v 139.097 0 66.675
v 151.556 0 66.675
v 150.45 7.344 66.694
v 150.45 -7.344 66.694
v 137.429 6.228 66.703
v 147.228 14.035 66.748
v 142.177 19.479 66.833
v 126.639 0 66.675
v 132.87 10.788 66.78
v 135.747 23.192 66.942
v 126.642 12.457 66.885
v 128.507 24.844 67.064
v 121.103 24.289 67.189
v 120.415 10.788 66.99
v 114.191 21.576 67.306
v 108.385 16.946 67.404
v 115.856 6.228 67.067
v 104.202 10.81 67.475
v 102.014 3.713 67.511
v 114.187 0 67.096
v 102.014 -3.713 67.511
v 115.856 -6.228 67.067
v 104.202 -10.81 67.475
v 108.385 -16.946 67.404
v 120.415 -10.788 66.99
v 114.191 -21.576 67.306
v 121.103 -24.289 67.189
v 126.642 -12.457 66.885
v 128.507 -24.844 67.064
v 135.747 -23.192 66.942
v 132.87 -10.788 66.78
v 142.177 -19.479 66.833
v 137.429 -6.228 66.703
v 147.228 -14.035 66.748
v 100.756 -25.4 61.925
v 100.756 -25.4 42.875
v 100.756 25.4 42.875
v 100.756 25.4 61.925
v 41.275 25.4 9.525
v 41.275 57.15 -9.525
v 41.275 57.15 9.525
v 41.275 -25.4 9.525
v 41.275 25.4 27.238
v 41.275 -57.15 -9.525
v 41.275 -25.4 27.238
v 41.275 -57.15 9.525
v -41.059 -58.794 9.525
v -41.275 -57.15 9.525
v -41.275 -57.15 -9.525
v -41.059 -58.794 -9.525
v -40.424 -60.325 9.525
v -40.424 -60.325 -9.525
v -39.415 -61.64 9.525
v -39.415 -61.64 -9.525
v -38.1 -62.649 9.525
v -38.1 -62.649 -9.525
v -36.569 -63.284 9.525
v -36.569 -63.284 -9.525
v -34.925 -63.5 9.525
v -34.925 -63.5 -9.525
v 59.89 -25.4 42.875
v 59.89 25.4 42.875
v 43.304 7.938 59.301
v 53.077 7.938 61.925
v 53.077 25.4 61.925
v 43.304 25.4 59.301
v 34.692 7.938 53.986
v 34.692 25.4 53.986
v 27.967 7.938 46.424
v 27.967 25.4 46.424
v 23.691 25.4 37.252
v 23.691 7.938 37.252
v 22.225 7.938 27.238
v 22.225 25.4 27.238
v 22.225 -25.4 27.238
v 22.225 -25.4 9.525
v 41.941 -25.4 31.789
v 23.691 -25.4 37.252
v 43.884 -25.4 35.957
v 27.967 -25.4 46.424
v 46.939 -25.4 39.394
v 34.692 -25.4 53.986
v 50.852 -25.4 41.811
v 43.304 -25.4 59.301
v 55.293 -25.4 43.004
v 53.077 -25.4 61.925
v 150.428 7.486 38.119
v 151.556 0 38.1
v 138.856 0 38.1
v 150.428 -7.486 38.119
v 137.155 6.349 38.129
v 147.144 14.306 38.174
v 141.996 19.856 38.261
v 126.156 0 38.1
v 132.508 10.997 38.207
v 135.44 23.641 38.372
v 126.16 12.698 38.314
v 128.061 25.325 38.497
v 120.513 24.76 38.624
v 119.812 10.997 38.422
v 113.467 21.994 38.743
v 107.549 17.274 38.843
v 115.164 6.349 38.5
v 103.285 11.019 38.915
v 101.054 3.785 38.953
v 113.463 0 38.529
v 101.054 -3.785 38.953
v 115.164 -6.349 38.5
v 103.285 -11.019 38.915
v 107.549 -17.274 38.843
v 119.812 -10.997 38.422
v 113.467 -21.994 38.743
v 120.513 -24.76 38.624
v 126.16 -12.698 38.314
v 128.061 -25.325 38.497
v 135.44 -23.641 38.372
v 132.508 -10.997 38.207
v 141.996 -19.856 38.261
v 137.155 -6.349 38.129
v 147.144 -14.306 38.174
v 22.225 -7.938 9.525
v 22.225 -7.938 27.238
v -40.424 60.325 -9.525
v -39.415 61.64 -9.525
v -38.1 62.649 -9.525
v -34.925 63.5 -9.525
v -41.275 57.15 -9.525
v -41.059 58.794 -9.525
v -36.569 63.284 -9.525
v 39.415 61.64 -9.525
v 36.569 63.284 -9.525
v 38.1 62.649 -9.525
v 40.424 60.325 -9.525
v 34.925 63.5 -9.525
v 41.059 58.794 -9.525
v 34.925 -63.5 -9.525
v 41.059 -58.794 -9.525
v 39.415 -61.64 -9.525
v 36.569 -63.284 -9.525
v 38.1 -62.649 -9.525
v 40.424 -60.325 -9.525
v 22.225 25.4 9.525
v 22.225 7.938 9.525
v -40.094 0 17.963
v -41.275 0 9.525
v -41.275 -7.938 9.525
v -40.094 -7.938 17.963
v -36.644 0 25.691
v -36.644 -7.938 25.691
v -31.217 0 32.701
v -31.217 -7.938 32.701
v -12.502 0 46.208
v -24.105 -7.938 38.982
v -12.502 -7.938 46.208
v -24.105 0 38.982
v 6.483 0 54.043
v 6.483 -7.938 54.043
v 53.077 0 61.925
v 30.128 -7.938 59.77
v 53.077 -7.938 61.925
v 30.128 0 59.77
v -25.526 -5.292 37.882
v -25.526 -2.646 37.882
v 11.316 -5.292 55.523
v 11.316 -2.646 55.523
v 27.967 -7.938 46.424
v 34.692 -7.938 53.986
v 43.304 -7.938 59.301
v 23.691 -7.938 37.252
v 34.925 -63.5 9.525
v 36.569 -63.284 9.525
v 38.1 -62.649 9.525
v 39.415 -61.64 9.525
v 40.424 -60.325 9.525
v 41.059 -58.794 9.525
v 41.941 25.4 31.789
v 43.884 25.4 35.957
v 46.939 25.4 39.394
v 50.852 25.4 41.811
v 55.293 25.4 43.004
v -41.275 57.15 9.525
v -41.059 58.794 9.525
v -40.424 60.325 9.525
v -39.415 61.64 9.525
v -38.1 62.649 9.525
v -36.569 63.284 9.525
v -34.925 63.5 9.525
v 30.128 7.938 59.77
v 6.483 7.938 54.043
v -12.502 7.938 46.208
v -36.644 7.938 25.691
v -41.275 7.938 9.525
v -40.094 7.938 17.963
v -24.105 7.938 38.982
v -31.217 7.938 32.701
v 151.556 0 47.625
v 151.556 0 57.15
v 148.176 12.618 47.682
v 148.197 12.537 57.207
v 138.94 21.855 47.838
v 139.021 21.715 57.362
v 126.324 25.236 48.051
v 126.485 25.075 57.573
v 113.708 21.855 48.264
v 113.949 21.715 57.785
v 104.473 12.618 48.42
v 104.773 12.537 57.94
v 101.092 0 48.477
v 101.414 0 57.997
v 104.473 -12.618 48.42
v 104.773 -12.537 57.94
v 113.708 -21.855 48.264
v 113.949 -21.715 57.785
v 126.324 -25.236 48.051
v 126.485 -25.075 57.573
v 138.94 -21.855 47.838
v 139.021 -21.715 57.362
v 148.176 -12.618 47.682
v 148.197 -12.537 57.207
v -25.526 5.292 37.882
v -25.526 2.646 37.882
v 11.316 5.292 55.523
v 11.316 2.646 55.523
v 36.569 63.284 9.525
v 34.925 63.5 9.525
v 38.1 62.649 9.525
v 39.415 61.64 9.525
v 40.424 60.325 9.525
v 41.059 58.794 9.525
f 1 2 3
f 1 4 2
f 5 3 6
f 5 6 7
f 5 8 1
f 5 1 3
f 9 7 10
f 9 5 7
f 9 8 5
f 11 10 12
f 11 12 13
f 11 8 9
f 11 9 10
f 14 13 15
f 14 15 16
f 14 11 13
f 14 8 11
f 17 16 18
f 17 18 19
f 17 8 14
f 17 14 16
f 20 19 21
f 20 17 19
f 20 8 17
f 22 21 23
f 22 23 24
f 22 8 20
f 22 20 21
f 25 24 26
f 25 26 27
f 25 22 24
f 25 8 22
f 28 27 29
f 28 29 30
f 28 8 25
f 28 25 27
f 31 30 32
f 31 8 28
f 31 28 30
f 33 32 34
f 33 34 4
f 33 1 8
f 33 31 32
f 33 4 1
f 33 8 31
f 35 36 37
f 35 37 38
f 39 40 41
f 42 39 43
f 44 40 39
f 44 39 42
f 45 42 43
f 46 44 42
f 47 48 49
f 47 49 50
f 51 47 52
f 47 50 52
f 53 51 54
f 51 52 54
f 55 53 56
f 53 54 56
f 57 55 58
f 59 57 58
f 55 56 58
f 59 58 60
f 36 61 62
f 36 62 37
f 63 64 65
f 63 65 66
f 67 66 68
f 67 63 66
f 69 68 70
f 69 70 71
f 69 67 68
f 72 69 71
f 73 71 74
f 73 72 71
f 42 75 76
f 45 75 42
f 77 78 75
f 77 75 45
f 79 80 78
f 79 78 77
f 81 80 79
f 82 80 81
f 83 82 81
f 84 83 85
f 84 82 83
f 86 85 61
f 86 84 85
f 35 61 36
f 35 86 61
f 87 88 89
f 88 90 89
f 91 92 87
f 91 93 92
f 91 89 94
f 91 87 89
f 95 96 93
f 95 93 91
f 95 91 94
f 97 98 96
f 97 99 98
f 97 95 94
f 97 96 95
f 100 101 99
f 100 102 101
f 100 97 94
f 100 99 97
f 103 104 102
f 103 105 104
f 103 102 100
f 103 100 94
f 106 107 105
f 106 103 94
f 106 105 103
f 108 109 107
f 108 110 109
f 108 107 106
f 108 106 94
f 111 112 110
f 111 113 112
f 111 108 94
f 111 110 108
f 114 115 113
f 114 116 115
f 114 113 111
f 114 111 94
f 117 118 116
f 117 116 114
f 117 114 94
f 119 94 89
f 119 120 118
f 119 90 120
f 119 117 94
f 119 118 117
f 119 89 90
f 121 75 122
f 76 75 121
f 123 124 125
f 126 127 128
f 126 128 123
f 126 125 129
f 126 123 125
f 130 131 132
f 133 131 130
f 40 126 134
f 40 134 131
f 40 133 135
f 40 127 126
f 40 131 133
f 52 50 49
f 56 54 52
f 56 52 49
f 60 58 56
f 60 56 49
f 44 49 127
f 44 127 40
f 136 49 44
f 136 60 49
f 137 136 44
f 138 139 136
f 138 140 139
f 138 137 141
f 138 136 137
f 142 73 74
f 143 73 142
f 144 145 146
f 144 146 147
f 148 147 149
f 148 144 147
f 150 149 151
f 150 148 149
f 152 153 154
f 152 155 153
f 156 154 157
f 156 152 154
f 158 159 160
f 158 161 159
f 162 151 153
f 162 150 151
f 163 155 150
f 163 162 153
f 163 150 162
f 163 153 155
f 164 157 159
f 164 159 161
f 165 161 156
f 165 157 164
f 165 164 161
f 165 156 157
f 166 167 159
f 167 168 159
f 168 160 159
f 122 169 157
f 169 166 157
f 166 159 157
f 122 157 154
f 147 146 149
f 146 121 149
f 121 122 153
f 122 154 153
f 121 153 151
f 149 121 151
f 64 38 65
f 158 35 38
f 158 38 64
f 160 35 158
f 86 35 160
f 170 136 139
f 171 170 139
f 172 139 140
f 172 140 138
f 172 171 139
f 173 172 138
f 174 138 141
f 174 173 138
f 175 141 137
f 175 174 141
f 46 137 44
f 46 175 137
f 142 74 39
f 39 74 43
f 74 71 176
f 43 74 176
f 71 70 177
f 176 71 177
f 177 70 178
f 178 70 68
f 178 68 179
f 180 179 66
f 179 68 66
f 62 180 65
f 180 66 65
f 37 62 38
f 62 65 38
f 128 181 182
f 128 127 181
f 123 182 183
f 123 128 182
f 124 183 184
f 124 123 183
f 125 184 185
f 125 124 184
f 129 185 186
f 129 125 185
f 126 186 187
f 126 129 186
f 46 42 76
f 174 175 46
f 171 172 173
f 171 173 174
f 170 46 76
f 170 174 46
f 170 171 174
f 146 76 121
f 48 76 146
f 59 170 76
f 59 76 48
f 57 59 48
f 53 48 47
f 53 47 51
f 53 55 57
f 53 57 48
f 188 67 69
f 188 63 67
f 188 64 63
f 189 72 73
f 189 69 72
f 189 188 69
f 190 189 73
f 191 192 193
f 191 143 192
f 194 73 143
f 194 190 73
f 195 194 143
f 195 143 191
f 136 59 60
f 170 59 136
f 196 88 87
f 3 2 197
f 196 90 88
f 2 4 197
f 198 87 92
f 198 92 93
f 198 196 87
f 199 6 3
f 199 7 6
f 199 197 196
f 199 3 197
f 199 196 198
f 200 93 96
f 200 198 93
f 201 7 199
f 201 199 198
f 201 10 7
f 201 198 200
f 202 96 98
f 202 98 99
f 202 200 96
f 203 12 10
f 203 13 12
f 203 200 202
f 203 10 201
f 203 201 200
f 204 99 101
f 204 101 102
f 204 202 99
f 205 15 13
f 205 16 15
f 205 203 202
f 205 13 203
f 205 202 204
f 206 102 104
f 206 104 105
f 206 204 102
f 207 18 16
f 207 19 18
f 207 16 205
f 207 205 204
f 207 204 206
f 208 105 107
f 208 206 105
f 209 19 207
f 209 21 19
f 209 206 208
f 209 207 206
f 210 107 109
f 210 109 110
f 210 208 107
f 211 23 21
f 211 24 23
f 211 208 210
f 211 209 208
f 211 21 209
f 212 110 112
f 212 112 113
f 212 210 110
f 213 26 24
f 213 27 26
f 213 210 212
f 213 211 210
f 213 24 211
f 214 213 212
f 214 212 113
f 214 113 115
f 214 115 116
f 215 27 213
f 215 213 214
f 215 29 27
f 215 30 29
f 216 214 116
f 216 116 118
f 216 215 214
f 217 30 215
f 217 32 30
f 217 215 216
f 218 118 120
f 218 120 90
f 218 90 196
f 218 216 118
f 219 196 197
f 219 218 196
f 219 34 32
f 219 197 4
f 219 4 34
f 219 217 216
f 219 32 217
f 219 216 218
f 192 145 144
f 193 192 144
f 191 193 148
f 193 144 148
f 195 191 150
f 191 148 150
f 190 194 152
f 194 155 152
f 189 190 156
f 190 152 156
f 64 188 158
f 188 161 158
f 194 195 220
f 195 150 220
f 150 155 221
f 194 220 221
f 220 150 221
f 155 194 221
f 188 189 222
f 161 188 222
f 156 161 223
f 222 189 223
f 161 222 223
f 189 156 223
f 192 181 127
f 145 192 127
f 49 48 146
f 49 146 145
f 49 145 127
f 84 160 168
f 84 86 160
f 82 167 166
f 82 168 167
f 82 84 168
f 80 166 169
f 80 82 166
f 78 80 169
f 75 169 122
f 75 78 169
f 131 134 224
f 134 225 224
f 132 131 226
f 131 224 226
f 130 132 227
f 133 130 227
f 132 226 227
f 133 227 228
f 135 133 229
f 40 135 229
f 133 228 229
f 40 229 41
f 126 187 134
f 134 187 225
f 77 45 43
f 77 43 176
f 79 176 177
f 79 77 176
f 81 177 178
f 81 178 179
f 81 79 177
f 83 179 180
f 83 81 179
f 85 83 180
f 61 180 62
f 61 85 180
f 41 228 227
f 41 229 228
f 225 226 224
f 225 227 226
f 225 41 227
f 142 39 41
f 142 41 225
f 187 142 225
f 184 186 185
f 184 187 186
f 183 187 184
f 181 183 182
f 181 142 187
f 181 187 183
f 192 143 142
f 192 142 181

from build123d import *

# Parameters (mm, degrees)
F1_DEPTH = 63.5
F2_DEPTH = 25.4
F3_DEPTH = 7.9375
F5_R     = 6.35


with BuildPart() as f1:
    # F0 (on Front) → F1 (new body, symmetric)
    with BuildSketch(Plane.XZ):
        Polygon((-41.275, 9.525), (-41.275, -9.525), (41.275, -9.525), (41.275, 9.525), (22.225, 9.525), align=None)
    extrude(amount=F1_DEPTH, both=True)

    # F0 (on Front) → F2 (join, symmetric)
    with BuildSketch(Plane.XZ):
        with BuildLine():
            Line((22.225, 9.525), (41.275, 9.525))
            Line((41.275, 9.525), (41.275, 27.2384566661))
            ThreePointArc((41.275, 27.2384566661), (46.9392873548, 39.393989245), (59.8900516254, 42.8752))
            Line((59.8900516254, 42.8752), (85.725, 42.8752))
            Line((85.725, 42.8752), (100.7562108994, 42.8752))
            Line((100.7562108994, 42.8752), (100.7562108994, 61.9252))
            Line((100.7562108994, 61.9252), (53.0774747529, 61.9252))
            ThreePointArc((53.0774747529, 61.9252), (31.0541328056, 50.4496897306), (22.225, 27.2384566661))
            Line((22.225, 27.2384566661), (22.225, 9.525))
        make_face()
    extrude(amount=F2_DEPTH, both=True)

    # F0 (on Front) → F3 (join, symmetric)
    with BuildSketch(Plane.XZ):
        with BuildLine():
            add(Edge.make_bspline(
                [(-41.275, 9.525), (-41.4647236466, 43.065674603), (14.2484912649, 61.3165572286), (53.0774747529, 61.9252)],
                knots=[0, 0, 0, 0, 107.9266901746, 107.9266901746, 107.9266901746, 107.9266901746], degree=3))
            Line((-41.275, 9.525), (22.225, 9.525))
            Line((22.225, 9.525), (22.225, 27.2384566661))
            ThreePointArc((22.225, 27.2384566661), (31.0541328056, 50.4496897306), (53.0774747529, 61.9252))
        make_face()
    extrude(amount=F3_DEPTH, both=True)

    # F5
    f5_edges = [f1.edges().sort_by_distance(p)[0] for p in [
        (-41.275, -63.5, 0),
        (41.275, -63.5, 0),
        (41.275, 63.5, 0),
        (-41.275, 63.5, 0),
    ]]
    fillet(f5_edges, radius=F5_R)


with BuildPart() as f4:
    # F0 (on Front) → F4 (revolve)
    with BuildSketch(Plane.XZ):
        Polygon((126.6386636257, 66.675), (126.5584692614, 61.9252), (126.1562108994, 38.1), (151.5562108994, 38.1), (151.5562108994, 66.675), align=None)
    revolve(axis=Axis((126.3974372625, 0, 52.3875), (0.016881329, 0, 0.9998575002)))


solid = Compound([f1.part, f4.part])
